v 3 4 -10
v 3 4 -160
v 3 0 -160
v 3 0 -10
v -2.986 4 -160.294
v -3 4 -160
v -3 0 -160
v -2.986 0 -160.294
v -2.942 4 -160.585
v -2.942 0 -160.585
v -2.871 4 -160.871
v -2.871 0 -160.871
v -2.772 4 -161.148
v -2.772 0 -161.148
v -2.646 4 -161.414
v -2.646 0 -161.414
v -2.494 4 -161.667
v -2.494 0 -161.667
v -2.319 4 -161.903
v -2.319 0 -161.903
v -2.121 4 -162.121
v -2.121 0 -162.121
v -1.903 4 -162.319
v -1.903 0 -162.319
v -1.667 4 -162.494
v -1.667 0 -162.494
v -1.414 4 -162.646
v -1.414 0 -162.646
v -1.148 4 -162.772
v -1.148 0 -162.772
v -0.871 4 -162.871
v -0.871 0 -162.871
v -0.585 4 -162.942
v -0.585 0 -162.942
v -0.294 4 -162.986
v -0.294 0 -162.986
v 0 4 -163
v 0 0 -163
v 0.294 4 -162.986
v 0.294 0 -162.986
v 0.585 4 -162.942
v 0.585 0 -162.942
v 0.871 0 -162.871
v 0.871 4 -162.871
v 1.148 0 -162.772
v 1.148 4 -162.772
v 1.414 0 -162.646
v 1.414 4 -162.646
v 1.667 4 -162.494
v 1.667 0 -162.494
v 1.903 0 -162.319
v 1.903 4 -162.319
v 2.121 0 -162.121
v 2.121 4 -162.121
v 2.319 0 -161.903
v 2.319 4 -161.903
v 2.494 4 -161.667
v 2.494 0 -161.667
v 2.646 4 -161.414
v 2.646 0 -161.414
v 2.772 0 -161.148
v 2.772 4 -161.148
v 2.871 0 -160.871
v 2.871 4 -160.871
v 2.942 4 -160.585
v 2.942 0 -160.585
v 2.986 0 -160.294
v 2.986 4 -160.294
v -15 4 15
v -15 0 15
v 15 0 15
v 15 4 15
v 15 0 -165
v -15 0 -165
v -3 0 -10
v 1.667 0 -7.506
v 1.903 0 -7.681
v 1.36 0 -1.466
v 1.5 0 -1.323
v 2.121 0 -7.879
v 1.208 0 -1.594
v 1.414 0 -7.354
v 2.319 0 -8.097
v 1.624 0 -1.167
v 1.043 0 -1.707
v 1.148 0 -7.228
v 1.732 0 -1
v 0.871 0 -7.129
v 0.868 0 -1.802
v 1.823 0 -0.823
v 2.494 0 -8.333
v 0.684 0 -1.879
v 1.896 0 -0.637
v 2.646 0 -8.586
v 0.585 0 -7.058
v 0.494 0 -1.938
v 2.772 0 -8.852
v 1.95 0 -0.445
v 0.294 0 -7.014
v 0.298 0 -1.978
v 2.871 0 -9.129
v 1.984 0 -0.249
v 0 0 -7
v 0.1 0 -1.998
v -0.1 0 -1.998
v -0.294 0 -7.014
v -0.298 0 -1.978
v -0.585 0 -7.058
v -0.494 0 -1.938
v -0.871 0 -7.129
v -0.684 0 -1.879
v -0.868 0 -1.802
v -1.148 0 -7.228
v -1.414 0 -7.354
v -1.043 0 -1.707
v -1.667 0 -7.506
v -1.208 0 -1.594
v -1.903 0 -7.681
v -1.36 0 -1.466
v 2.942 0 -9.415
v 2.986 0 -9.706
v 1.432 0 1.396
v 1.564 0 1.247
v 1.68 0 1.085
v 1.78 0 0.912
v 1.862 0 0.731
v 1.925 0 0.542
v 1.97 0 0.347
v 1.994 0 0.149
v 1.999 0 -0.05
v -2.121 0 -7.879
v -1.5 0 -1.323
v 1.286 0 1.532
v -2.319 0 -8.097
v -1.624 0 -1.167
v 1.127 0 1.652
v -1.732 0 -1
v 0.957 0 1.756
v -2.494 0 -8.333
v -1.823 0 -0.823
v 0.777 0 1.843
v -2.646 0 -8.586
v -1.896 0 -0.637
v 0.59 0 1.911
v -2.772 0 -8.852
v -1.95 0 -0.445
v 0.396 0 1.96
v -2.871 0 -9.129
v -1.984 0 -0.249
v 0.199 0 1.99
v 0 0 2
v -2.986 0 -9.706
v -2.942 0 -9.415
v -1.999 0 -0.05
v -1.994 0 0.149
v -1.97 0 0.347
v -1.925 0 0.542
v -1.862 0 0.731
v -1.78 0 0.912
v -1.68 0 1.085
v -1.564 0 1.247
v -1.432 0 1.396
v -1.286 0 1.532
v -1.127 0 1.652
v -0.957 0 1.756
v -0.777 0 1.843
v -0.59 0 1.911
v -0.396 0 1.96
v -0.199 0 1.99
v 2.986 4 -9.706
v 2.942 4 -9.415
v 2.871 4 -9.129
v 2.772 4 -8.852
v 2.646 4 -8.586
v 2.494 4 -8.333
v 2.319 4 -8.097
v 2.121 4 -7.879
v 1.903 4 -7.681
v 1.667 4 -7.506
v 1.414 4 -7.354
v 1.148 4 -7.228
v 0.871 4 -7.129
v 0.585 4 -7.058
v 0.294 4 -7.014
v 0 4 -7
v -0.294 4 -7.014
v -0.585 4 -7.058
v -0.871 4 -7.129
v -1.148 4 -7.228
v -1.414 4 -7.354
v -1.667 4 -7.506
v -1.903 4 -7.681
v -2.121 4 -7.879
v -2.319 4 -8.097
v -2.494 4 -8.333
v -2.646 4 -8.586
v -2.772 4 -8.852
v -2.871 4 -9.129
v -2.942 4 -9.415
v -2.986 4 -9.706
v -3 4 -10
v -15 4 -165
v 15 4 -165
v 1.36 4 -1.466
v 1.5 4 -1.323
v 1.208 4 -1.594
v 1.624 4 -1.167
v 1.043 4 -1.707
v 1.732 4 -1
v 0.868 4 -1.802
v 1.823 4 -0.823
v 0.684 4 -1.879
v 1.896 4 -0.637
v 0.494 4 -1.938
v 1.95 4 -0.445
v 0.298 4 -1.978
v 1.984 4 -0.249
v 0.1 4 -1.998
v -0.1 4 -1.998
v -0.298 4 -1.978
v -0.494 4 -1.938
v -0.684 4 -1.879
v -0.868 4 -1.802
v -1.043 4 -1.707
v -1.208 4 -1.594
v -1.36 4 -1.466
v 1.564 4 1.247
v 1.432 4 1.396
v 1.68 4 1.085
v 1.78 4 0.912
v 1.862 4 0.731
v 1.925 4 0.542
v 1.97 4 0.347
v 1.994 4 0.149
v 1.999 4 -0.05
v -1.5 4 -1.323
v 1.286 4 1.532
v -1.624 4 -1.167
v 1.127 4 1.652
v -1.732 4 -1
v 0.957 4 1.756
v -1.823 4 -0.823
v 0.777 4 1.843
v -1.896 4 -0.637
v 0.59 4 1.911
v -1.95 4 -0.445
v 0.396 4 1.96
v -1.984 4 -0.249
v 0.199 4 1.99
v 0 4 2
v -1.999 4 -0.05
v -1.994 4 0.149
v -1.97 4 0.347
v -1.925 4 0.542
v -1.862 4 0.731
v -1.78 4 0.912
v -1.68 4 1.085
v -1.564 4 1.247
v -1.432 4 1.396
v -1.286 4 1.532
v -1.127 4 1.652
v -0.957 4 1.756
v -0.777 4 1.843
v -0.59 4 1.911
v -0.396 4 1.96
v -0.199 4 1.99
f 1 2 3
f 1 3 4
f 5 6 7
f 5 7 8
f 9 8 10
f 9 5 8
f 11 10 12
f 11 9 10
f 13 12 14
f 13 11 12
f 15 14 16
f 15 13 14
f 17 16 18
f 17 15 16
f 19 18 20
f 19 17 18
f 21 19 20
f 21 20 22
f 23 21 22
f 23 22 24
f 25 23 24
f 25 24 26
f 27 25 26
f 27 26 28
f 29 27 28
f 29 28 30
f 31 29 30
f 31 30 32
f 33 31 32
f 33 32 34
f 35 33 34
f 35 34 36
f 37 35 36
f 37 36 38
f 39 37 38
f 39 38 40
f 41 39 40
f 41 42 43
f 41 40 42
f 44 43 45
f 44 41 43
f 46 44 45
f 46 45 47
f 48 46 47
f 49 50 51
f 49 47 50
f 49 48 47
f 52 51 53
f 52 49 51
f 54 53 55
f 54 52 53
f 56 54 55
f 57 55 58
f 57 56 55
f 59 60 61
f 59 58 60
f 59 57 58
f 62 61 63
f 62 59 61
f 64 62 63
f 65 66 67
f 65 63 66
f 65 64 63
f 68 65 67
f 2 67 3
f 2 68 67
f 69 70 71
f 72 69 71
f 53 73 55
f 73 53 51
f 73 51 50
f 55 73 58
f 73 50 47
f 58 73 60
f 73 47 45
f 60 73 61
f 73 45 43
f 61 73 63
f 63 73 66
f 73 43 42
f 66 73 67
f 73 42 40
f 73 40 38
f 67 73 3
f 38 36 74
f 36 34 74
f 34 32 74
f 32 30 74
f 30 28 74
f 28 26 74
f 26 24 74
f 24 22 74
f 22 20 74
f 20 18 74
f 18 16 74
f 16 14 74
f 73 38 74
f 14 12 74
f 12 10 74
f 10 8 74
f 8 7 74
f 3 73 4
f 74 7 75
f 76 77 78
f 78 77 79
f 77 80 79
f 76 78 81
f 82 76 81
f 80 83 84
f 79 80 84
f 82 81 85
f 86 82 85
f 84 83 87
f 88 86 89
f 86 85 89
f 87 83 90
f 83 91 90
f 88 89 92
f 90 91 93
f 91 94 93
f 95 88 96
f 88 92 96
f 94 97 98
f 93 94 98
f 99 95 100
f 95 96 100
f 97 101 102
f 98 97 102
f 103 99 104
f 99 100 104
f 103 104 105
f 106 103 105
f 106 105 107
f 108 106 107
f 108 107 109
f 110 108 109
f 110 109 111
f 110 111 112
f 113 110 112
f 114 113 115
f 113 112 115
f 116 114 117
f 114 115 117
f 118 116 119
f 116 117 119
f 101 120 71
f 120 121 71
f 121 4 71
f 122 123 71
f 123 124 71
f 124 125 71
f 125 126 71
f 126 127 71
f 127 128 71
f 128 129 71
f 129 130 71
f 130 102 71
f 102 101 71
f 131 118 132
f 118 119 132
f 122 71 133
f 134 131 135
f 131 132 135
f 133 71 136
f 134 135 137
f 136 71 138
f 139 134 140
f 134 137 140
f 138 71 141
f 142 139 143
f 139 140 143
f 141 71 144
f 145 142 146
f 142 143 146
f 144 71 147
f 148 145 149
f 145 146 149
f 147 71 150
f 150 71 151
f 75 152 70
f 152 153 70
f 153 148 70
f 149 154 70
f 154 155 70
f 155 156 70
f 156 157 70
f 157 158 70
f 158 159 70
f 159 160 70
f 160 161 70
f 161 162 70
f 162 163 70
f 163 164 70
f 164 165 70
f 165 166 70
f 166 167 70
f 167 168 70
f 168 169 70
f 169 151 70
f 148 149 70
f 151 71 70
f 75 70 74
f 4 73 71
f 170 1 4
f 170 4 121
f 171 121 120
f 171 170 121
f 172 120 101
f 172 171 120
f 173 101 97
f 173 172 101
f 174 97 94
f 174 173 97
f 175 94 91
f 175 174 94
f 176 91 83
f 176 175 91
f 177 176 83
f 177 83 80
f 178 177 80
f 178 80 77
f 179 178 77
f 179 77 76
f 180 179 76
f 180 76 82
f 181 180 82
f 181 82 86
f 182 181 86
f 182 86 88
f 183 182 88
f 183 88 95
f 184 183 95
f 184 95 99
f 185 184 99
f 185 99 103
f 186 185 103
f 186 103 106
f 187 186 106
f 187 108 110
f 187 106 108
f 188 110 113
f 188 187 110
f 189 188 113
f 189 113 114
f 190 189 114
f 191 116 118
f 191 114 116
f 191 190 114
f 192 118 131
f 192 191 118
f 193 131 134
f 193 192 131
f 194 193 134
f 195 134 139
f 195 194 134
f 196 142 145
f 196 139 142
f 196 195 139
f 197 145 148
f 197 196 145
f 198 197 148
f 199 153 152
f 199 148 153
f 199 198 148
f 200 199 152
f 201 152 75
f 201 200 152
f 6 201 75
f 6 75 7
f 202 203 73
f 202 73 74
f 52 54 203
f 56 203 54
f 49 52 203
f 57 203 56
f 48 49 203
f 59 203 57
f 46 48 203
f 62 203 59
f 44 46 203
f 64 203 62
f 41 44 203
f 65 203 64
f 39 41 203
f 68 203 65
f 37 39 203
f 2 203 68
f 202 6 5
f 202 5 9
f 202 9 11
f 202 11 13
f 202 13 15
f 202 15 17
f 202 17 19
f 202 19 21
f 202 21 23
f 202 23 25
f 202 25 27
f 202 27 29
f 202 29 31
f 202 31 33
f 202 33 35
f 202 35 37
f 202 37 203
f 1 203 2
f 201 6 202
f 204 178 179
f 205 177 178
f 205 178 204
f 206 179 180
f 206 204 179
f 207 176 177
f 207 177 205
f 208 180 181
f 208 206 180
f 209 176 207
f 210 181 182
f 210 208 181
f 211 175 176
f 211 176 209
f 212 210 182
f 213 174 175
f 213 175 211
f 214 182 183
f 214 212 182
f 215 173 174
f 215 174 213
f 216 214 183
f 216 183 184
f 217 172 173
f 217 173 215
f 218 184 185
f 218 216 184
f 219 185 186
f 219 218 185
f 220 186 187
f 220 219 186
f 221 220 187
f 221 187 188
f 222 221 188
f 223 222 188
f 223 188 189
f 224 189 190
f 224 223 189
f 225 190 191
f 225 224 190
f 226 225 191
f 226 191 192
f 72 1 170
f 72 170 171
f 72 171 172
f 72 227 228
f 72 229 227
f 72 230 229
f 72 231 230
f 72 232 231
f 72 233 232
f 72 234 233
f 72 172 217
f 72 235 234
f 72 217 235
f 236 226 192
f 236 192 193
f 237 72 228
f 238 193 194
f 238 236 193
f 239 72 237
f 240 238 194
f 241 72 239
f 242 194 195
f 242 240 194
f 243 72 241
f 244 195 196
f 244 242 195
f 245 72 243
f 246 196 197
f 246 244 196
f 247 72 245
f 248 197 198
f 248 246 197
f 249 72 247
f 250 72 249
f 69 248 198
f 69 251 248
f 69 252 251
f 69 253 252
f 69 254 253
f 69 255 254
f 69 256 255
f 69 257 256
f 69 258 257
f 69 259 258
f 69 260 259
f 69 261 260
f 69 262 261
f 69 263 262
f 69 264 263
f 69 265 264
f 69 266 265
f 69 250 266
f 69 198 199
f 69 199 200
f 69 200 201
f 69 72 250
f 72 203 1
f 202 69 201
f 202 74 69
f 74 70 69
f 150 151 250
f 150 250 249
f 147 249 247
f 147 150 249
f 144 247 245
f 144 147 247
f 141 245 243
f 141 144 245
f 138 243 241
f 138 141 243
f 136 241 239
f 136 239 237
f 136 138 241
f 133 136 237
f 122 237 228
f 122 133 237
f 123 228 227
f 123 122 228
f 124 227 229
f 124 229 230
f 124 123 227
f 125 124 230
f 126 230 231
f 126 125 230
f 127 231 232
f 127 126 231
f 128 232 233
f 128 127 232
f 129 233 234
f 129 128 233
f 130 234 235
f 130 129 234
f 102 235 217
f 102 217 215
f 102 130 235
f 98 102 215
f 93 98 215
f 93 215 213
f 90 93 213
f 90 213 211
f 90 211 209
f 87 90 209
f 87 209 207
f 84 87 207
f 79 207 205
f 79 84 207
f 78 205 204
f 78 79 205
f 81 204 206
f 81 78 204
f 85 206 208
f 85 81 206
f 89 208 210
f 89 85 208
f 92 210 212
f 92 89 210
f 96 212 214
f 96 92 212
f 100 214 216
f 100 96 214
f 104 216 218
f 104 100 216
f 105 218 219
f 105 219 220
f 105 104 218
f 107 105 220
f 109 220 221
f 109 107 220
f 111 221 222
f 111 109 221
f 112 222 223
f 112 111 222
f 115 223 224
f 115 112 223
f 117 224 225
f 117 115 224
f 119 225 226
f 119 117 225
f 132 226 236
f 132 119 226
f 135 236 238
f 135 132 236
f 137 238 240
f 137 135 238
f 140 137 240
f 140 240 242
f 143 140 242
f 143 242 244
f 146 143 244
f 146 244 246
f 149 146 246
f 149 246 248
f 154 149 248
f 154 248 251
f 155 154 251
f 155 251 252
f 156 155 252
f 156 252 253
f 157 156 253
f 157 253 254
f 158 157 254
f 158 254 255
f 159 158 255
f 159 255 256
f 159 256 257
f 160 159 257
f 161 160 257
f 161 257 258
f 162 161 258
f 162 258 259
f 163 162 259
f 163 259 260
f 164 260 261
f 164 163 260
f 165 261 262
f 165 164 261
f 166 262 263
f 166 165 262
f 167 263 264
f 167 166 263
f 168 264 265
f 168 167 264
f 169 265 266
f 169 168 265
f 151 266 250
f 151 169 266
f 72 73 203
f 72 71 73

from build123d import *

# Parameters (mm, degrees)
SKETCH1_W           = 30
SKETCH1_H           = 30
SKETCH1_R           = 2
BOSS_EXTRUDE1_DEPTH = 4
SKETCH2_W           = 30
SKETCH2_H           = 4
BOSS_EXTRUDE2_DEPTH = 150
CUT_EXTRUDE1_DEPTH  = 166.728693955


with BuildPart() as part:
    # Sketch1 → Boss-Extrude1 (new body)
    with BuildSketch(Plane(origin=(0, 0, 0), x_dir=(1, 0, 0), z_dir=(0, 1, 0))):
        Rectangle(SKETCH1_W, SKETCH1_H)
        with Locations(Location((0, 0, 0), (0, 0, 270))):
            Circle(SKETCH1_R, mode=Mode.SUBTRACT)
    extrude(amount=BOSS_EXTRUDE1_DEPTH)

    # Sketch2 → Boss-Extrude2 (add)
    with BuildSketch(Plane(origin=(0, 0, -15), x_dir=(-1, 0, 0), z_dir=(0, 0, -1))):
        with Locations((0, 2)):
            Rectangle(SKETCH2_W, SKETCH2_H)
    extrude(amount=BOSS_EXTRUDE2_DEPTH)

    # Sketch3 → Cut-Extrude1 (cut, through all)
    with BuildSketch(Plane(origin=(0, 4, 0), x_dir=(1, 0, 0), z_dir=(0, 1, 0))):
        with BuildLine():
            Line((-3, 10), (-3, 160))
            ThreePointArc((-3, 160), (0, 163), (3, 160))
            Line((3, 160), (3, 10))
            ThreePointArc((3, 10), (0, 7), (-3, 10))
        make_face()
    extrude(amount=-CUT_EXTRUDE1_DEPTH, mode=Mode.SUBTRACT)


solid = part.part
